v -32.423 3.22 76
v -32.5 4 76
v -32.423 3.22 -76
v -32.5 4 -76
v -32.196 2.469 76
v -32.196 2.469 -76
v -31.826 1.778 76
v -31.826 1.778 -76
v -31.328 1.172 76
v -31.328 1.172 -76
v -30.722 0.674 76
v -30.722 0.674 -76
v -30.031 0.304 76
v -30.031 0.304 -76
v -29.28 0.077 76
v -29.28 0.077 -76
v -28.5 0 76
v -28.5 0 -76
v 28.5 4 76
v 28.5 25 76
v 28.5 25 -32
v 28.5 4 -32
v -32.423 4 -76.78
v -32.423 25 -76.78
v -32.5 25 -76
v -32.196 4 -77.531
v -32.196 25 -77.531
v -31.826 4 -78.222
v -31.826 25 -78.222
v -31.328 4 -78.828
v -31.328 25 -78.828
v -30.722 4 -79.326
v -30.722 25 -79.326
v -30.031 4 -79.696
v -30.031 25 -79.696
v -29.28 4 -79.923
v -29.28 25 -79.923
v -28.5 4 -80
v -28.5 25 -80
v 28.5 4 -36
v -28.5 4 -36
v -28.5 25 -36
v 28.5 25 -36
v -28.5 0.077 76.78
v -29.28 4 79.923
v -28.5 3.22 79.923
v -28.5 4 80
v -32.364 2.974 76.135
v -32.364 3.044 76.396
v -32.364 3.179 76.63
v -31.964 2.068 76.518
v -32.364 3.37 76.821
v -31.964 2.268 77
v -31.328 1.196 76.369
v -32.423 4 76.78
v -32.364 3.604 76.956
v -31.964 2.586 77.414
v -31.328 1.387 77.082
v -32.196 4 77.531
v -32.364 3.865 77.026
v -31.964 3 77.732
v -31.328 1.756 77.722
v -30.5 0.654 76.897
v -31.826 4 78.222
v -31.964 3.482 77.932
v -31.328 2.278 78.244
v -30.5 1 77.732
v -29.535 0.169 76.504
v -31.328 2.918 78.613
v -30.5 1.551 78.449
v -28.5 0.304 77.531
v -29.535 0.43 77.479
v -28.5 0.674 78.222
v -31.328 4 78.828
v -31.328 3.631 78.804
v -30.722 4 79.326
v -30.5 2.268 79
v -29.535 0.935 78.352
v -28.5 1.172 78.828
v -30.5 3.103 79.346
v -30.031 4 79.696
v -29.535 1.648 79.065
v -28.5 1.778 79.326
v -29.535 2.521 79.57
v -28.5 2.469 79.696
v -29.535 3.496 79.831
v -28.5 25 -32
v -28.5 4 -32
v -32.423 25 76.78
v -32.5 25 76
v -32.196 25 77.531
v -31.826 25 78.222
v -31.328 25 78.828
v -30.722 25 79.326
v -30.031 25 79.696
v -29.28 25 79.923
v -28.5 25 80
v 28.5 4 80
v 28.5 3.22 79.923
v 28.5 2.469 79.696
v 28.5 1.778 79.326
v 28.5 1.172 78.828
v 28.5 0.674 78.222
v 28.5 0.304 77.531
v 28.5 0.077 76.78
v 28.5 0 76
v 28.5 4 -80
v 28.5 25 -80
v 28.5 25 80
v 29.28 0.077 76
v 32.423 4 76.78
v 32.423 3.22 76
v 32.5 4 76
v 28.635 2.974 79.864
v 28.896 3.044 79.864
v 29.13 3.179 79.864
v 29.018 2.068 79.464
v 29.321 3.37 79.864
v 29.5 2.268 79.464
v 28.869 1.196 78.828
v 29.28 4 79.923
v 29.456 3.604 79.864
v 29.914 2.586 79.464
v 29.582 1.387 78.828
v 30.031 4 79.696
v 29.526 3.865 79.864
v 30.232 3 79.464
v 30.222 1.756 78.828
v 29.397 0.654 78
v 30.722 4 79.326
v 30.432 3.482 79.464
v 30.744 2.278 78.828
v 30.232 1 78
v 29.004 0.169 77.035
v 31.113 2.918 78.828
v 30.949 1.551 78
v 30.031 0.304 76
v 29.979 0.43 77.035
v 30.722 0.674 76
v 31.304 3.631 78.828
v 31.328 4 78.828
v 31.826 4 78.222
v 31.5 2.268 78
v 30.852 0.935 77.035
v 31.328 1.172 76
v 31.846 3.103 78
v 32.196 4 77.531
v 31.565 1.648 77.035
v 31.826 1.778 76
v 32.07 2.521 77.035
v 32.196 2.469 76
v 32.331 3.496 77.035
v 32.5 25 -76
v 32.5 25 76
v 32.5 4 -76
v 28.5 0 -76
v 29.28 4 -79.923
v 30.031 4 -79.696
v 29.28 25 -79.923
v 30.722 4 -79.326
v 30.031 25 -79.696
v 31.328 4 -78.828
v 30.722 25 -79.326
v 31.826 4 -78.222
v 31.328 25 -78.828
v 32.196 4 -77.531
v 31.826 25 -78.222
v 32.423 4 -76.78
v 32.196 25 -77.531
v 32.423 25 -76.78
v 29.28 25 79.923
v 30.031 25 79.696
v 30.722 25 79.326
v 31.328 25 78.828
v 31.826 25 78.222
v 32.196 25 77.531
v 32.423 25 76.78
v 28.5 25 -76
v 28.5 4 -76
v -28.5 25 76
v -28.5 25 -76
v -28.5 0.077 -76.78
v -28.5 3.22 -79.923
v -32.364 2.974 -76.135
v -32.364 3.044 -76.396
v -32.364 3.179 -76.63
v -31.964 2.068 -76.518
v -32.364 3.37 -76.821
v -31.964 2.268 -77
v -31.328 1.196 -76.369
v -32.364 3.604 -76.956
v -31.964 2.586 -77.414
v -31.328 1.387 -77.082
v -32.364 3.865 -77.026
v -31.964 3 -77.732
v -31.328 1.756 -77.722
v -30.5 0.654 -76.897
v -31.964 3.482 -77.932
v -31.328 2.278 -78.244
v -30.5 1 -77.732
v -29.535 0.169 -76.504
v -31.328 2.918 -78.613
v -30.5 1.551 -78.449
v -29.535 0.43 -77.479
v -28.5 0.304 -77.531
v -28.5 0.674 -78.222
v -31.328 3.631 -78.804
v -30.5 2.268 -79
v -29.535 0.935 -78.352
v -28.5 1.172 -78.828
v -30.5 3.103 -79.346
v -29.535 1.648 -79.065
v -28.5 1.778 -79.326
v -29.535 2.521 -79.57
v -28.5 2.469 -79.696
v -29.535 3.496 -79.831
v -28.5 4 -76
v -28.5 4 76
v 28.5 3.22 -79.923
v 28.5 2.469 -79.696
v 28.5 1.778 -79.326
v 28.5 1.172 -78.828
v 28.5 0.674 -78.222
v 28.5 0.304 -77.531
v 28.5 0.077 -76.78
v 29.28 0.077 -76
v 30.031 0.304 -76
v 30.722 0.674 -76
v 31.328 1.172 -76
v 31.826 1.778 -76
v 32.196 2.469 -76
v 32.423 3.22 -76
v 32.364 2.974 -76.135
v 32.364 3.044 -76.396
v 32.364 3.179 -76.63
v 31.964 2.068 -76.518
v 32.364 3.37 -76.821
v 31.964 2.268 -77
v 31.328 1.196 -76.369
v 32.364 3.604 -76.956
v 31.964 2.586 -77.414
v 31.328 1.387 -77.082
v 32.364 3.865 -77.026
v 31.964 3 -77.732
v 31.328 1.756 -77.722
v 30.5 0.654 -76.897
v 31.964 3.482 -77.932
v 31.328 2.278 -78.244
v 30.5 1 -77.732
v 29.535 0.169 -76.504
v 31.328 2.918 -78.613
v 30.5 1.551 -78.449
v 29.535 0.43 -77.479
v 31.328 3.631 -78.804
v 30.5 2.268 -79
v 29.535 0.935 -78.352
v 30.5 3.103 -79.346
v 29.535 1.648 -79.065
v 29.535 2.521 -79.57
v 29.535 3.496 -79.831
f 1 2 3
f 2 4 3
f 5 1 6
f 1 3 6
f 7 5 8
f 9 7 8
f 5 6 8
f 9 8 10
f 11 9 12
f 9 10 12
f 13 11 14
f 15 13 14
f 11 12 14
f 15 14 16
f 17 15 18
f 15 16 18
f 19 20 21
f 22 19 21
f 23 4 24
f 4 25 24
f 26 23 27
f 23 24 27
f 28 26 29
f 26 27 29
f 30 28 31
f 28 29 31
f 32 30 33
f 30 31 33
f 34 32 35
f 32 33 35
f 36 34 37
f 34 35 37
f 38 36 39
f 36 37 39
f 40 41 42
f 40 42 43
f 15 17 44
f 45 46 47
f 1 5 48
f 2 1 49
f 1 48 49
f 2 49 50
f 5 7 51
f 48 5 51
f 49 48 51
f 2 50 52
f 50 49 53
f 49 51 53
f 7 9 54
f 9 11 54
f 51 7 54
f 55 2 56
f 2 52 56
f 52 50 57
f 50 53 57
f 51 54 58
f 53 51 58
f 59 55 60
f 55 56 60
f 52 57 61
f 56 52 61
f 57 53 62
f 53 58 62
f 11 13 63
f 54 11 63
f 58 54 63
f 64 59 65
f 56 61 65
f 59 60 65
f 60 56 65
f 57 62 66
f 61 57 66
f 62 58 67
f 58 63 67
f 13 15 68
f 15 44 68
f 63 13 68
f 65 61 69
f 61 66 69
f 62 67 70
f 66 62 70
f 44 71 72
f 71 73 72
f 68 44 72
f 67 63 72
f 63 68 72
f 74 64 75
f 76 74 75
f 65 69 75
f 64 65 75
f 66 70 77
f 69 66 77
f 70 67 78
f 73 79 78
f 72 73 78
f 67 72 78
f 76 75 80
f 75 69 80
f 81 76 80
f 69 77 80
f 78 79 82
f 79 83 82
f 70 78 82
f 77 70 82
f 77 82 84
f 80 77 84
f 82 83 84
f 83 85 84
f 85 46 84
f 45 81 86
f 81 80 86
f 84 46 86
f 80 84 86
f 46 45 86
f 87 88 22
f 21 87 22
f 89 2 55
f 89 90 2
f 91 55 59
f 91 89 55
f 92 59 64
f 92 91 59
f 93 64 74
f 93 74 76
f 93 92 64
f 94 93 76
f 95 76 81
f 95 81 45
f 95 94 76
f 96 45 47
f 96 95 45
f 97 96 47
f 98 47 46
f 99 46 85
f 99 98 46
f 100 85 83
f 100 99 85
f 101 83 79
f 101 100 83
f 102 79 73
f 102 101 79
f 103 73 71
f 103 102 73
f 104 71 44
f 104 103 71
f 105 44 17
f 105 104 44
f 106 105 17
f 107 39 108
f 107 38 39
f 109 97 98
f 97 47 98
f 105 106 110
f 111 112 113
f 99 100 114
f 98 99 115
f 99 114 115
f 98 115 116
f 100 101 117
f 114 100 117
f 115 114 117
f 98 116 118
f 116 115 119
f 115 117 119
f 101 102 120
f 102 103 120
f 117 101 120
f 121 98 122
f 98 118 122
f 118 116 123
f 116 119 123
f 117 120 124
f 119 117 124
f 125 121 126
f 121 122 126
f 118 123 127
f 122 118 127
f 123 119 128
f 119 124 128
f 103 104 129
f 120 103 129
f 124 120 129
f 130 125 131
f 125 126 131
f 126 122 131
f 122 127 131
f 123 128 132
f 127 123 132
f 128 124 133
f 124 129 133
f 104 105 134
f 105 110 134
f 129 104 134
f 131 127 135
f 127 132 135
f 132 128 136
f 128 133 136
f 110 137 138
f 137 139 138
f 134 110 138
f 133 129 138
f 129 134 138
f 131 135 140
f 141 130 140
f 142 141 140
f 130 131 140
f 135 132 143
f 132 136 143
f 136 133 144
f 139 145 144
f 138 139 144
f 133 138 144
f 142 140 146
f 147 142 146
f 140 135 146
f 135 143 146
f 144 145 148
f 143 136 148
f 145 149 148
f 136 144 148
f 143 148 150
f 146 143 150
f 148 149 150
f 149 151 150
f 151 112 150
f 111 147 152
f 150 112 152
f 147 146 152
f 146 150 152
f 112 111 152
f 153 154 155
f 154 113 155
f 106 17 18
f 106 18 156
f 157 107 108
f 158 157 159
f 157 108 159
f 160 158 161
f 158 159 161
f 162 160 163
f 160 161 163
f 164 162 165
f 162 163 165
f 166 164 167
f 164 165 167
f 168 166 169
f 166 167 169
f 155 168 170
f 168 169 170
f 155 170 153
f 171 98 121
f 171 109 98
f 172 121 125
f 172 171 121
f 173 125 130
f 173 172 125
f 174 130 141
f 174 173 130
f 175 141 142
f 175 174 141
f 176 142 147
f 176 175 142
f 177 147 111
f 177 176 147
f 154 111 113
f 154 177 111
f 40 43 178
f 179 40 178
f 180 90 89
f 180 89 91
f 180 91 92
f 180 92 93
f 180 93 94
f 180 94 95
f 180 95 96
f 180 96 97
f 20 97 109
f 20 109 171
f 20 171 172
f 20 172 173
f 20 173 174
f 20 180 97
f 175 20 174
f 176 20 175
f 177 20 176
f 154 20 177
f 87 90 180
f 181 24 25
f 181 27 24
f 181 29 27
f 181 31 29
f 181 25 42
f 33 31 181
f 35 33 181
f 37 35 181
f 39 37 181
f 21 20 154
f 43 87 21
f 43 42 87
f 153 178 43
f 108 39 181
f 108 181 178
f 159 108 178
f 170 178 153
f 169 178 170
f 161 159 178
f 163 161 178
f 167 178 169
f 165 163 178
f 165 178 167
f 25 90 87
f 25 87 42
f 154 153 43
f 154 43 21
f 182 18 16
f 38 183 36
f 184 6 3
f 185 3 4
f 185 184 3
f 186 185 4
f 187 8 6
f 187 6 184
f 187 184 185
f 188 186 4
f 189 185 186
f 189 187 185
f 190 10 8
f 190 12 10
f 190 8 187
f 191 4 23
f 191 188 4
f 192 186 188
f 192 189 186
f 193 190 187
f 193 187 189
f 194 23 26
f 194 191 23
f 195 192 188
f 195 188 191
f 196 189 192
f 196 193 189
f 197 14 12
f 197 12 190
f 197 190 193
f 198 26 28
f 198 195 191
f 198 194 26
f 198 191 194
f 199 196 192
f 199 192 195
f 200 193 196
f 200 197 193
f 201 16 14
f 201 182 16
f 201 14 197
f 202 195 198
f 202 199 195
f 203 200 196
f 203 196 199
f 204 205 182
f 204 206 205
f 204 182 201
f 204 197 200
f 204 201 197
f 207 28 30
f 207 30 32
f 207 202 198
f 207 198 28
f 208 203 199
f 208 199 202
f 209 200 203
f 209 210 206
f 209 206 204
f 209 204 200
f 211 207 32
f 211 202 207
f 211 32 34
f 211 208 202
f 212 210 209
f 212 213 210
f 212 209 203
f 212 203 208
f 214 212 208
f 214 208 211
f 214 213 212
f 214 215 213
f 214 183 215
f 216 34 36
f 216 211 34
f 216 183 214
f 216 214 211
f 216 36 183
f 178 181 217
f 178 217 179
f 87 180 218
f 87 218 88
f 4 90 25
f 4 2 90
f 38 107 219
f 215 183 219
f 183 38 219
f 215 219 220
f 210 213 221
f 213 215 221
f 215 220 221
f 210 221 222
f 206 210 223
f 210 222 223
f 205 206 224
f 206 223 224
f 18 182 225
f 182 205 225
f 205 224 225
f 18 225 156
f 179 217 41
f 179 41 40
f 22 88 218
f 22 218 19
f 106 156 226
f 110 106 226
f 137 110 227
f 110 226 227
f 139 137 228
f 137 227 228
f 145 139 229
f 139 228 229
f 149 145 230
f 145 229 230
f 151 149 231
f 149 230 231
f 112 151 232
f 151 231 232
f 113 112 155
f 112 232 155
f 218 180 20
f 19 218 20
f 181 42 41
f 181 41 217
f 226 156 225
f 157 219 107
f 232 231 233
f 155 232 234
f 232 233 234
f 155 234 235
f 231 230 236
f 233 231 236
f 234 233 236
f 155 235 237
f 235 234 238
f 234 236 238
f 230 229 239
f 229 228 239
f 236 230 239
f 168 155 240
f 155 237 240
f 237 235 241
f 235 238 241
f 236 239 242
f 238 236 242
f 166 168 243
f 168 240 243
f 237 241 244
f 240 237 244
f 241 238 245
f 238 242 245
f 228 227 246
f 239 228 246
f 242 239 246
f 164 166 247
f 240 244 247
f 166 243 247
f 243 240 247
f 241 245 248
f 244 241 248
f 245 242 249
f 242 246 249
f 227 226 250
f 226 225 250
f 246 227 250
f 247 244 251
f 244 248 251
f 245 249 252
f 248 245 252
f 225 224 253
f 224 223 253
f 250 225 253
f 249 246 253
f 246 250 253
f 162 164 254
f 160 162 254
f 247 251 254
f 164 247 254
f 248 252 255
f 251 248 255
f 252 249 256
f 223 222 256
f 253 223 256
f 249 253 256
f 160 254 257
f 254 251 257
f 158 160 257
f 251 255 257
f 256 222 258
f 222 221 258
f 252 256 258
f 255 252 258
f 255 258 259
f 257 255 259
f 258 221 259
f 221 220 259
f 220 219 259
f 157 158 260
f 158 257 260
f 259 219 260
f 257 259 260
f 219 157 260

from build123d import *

# Parameters (mm, degrees)
SKETCH2_W          = 65
SKETCH2_H          = 160
BASE_DEPTH         = 25
SKETCH3_W          = 57
SKETCH3_H          = 152
INSIDE_SPACE_DEPTH = 21
SKETCH4_W          = 57
SKETCH4_H          = 4
BATTERY_WALL_DEPTH = 21
FILLET1_R          = 4


with BuildPart() as part:
    # Sketch2 → Base (new body)
    with BuildSketch(Plane(origin=(0, 0, 0), x_dir=(1, 0, 0), z_dir=(0, 1, 0))):
        Rectangle(SKETCH2_W, SKETCH2_H)
    extrude(amount=BASE_DEPTH)

    # Sketch3 → Inside Space (cut)
    with BuildSketch(Plane(origin=(0, 25, 0), x_dir=(1, 0, 0), z_dir=(0, 1, 0))):
        Rectangle(SKETCH3_W, SKETCH3_H)
    extrude(amount=-INSIDE_SPACE_DEPTH, mode=Mode.SUBTRACT)

    # Sketch4 → Battery Wall (add)
    with BuildSketch(Plane(origin=(0, 4, 0), x_dir=(1, 0, 0), z_dir=(0, 1, 0))):
        with Locations((0, 34)):
            Rectangle(SKETCH4_W, SKETCH4_H)
    extrude(amount=BATTERY_WALL_DEPTH)

    # Fillet1
    fillet1_edges = [part.edges().sort_by_distance(p)[0] for p in [
        (0, 0, -80),
        (32.5, 0, 0),
        (0, 0, 80),
        (-32.5, 0, 0),
        (-32.5, 12.5, -80),
        (32.5, 12.5, -80),
        (32.5, 12.5, 80),
        (-32.5, 12.5, 80),
    ]]
    fillet(fillet1_edges, radius=FILLET1_R)


solid = part.part
